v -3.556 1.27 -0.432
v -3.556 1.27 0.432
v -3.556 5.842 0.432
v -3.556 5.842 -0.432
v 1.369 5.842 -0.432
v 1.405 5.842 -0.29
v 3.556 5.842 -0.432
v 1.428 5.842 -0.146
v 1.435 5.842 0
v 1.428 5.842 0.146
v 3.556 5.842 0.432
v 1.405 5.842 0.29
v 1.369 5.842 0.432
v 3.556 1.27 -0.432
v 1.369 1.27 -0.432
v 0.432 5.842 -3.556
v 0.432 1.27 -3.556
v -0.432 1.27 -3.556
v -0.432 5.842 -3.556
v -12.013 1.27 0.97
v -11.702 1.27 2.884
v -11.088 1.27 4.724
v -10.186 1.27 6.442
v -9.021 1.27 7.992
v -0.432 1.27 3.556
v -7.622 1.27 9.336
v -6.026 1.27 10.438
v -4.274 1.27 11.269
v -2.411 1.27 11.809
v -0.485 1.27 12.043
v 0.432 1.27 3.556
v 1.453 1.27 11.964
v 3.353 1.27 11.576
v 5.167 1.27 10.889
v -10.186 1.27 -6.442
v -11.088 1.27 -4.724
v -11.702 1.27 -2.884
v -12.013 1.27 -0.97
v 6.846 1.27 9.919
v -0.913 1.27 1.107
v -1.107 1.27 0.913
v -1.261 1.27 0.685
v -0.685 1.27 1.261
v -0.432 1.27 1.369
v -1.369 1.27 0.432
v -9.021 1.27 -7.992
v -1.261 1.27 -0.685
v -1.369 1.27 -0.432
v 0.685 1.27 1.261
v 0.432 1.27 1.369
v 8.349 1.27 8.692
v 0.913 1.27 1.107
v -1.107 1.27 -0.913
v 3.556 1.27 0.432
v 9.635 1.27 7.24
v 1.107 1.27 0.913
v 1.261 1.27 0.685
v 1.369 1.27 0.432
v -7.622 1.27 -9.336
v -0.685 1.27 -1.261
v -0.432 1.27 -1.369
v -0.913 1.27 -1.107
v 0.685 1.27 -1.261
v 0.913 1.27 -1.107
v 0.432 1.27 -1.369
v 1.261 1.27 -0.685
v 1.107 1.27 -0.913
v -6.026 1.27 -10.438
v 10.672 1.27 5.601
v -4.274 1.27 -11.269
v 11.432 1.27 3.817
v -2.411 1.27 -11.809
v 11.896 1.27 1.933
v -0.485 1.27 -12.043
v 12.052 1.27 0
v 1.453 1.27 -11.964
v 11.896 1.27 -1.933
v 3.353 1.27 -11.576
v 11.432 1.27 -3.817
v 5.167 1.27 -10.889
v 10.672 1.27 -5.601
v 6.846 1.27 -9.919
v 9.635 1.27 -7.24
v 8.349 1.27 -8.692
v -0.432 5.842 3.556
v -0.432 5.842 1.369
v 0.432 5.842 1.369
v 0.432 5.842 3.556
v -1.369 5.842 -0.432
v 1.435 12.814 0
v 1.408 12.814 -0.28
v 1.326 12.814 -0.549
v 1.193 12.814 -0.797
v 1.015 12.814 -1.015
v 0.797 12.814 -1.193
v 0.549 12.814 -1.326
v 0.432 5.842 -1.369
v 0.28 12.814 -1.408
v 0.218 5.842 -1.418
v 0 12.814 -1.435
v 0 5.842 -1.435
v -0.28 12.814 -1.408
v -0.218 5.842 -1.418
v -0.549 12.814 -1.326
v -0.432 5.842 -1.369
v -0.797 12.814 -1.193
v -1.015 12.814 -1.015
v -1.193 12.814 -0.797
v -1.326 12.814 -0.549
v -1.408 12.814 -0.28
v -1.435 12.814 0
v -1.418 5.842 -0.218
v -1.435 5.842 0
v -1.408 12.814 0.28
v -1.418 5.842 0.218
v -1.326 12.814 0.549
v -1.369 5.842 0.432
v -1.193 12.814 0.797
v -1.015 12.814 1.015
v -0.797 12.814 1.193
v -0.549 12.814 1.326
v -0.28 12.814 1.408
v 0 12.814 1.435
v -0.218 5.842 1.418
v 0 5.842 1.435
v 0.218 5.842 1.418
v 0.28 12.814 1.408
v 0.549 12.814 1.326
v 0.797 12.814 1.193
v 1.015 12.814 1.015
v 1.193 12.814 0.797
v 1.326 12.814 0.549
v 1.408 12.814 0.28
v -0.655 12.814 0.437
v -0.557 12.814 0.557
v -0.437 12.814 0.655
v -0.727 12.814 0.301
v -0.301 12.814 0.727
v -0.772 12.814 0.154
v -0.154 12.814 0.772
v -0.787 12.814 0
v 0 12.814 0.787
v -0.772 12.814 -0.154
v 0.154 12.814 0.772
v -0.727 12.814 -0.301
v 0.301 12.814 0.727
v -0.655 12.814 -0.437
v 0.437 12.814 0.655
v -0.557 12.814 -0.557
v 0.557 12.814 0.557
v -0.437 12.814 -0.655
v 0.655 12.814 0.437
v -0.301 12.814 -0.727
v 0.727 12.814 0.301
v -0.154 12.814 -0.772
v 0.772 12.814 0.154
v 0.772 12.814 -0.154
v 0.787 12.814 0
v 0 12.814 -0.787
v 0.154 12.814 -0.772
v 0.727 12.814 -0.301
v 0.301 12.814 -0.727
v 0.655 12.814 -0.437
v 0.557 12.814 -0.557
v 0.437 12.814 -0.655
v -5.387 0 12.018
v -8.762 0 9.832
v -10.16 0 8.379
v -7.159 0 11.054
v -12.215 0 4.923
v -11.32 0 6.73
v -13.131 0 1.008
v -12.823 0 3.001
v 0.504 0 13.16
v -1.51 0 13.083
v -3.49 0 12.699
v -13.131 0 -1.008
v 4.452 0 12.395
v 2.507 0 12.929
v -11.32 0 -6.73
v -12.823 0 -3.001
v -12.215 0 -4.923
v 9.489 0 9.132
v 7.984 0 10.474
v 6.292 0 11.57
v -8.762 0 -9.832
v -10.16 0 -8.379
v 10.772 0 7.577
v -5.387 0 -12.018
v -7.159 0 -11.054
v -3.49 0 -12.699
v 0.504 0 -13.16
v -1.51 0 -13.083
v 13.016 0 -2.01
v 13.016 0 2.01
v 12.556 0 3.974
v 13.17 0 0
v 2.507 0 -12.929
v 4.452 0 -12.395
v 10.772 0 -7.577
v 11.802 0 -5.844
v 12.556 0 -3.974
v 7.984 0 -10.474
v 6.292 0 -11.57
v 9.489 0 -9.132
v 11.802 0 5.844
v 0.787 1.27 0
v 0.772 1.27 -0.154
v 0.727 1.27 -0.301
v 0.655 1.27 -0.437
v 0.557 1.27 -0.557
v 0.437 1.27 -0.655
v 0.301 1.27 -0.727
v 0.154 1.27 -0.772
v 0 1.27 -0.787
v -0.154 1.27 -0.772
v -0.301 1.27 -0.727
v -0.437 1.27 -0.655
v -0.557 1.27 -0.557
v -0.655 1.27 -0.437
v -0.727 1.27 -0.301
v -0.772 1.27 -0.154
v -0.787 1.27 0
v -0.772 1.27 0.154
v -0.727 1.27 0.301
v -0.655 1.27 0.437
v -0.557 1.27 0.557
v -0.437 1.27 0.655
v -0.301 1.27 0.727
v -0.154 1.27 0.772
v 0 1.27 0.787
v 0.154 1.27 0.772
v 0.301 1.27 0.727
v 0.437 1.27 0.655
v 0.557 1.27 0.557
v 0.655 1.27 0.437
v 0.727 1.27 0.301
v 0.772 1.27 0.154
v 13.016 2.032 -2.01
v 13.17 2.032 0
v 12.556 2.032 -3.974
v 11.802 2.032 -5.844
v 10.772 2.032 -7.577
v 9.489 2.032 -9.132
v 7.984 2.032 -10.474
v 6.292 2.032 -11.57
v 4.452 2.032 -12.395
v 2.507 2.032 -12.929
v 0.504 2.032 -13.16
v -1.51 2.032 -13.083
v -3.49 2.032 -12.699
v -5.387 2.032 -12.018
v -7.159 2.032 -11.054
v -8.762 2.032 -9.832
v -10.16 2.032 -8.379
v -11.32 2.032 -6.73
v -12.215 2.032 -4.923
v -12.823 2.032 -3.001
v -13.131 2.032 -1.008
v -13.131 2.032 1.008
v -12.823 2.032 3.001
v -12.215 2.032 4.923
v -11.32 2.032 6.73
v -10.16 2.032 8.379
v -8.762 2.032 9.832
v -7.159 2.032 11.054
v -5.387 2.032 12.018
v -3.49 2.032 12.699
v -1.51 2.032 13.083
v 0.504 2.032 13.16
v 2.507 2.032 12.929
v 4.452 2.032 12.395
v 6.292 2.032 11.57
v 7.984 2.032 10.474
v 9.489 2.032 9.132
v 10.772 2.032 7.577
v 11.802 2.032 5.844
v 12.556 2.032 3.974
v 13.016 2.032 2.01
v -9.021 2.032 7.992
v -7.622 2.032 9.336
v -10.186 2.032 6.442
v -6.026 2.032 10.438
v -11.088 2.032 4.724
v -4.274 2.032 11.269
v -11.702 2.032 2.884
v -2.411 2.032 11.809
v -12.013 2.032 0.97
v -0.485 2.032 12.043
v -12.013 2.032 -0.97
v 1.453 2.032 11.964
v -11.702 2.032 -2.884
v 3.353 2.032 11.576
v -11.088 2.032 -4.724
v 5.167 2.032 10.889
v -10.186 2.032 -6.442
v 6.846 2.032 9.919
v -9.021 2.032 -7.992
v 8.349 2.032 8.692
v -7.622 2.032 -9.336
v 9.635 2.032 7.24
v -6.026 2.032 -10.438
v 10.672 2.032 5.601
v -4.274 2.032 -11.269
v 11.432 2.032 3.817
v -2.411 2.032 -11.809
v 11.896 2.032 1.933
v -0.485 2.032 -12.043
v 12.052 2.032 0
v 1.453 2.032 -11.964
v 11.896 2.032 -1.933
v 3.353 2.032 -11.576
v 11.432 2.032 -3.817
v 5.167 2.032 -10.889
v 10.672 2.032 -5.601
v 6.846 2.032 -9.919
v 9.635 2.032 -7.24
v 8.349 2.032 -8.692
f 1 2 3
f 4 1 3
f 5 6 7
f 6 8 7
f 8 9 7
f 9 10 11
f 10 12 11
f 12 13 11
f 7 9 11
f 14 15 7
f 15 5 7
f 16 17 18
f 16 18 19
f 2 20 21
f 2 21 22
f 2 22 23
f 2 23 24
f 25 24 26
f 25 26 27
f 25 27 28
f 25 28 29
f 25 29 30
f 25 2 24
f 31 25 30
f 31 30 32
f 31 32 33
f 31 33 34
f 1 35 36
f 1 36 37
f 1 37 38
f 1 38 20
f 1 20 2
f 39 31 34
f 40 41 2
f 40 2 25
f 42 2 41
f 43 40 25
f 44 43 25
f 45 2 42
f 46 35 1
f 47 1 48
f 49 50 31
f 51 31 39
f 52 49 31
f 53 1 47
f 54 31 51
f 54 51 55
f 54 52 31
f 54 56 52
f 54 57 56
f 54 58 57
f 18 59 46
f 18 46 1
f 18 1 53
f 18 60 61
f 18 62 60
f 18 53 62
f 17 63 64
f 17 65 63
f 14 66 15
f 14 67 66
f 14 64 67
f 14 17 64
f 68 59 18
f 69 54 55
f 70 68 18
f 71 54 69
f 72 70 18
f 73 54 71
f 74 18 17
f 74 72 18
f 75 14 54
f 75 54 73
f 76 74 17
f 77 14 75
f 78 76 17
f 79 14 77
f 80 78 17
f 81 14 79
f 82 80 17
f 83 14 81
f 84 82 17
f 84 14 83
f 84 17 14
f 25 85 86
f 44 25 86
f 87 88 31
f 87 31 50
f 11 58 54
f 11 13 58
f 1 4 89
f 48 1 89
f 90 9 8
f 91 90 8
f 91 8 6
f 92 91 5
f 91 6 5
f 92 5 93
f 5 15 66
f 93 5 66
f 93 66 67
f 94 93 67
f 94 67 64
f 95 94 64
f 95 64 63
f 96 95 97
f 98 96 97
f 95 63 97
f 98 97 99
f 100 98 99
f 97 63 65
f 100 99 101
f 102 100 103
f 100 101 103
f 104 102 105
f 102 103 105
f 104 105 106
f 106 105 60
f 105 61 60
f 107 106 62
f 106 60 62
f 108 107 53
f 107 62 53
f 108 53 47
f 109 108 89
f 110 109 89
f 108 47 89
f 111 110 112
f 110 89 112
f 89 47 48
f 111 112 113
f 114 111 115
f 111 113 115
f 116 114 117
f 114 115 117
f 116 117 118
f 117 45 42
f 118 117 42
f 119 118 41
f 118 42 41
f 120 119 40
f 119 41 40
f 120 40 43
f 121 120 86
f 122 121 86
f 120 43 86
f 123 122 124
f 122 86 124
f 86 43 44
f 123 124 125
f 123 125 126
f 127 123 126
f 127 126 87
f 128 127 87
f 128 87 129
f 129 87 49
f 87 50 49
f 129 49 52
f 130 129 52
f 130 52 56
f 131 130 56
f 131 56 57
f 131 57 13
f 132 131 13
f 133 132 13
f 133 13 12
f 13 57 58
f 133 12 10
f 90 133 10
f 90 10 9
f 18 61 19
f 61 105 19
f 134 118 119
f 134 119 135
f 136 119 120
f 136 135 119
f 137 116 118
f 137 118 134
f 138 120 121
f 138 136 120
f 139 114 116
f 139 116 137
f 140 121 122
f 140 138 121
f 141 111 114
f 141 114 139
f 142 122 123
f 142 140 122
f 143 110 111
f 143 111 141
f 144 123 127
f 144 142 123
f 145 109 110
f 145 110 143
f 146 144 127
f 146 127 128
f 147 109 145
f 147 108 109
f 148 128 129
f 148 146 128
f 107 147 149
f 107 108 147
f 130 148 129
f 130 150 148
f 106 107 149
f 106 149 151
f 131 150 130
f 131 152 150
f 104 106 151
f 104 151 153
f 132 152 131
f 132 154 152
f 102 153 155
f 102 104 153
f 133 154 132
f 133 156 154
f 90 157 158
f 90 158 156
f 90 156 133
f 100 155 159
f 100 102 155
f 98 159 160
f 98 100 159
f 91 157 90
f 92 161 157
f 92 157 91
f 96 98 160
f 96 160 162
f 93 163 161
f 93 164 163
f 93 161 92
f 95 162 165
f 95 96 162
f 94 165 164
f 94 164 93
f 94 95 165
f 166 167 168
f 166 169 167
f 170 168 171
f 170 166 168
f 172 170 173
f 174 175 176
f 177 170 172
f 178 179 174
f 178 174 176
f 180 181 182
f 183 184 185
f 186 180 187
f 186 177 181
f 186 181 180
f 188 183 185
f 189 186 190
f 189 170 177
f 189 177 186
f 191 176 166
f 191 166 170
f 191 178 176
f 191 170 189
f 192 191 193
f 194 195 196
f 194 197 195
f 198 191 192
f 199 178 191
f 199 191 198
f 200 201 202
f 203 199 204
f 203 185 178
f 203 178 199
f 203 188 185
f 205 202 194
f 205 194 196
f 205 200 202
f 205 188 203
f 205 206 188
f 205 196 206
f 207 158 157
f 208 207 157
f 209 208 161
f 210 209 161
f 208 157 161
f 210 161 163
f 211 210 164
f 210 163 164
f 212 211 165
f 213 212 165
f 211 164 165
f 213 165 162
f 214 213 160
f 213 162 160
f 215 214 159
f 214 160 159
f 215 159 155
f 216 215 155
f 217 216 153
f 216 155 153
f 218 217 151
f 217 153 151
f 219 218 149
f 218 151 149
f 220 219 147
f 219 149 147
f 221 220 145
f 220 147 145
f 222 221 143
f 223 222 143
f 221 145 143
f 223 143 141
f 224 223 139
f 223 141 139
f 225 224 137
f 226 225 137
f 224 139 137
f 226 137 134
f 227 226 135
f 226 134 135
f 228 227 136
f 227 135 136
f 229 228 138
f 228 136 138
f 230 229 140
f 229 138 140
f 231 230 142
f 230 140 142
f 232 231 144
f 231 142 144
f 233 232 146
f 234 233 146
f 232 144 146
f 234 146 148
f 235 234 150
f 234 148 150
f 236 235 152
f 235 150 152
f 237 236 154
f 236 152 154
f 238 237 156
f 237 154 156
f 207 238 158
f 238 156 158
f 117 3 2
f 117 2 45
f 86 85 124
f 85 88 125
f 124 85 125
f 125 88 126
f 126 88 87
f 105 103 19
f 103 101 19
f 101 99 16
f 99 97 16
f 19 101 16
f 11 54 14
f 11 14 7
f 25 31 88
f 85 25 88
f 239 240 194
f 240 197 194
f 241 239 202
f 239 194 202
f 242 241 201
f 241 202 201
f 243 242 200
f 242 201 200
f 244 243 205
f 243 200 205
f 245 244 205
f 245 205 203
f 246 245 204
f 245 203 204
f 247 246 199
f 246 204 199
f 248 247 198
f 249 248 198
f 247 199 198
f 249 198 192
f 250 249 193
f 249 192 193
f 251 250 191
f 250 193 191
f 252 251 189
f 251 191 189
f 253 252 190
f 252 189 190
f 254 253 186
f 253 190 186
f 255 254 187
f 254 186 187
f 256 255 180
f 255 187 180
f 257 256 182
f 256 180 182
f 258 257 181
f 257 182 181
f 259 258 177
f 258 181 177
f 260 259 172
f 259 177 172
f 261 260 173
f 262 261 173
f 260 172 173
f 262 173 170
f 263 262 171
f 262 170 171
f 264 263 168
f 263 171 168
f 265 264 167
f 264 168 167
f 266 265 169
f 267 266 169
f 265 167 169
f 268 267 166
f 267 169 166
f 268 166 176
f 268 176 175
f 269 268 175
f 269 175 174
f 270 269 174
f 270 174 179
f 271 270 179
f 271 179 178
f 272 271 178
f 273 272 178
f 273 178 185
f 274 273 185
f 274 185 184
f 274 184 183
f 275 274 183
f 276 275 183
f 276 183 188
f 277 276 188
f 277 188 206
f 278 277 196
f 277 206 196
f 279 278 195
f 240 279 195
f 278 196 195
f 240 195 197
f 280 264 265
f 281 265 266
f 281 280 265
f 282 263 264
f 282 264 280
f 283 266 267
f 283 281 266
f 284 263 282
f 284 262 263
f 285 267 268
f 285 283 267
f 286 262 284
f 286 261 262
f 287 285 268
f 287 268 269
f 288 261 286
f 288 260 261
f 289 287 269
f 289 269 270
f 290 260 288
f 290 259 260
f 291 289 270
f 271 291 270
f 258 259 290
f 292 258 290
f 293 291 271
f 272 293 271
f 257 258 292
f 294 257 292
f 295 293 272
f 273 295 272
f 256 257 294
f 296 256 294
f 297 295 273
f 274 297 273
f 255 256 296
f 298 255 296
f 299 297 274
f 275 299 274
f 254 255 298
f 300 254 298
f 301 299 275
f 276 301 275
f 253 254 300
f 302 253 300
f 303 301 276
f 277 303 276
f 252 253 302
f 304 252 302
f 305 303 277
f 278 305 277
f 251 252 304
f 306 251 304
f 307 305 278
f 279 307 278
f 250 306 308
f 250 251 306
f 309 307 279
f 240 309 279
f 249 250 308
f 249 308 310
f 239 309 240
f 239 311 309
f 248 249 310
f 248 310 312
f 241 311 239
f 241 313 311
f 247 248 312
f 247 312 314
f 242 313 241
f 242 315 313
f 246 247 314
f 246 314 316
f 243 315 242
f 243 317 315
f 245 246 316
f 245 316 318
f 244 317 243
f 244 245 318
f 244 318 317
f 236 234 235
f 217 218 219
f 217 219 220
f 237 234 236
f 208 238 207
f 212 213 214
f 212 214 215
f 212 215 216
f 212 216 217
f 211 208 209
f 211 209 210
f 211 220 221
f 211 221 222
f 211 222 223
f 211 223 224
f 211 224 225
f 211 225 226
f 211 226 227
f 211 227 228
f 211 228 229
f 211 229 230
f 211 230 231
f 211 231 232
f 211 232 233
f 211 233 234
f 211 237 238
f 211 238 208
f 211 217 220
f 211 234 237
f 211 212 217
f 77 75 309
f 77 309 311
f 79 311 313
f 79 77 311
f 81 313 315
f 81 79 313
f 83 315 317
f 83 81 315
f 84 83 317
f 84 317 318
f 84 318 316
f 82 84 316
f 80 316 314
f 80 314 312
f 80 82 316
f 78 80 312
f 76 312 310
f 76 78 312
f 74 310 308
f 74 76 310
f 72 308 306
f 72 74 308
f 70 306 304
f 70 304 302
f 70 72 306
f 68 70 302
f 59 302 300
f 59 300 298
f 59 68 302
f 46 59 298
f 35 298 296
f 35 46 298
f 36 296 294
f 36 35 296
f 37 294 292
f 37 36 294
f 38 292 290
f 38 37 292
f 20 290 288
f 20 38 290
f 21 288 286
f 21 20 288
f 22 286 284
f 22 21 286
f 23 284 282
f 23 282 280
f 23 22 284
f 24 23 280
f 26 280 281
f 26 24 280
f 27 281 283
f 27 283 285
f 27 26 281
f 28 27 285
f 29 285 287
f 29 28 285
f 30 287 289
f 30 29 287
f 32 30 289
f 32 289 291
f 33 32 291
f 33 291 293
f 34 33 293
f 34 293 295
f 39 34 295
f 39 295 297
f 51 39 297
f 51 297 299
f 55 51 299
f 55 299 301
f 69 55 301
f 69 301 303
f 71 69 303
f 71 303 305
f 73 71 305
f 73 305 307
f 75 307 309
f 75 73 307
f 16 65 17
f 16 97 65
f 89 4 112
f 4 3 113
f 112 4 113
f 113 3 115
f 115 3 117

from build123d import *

# Parameters (mm, degrees)
SKETCH1_R           = 13.1699
BOSS_EXTRUDE1_DEPTH = 1.27
SKETCH2_R           = 13.1699
SKETCH2_R_2         = 12.0523
BOSS_EXTRUDE2_DEPTH = 0.762
SKETCH3_R           = 1.4351
BOSS_EXTRUDE3_DEPTH = 11.5443
SKETCH6_W           = 7.112
SKETCH6_H           = 5.842
BOSS_EXTRUDE4_DEPTH = 0.4318
SKETCH7_W           = 7.112
SKETCH7_H           = 5.842
BOSS_EXTRUDE5_DEPTH = 0.4318
SKETCH4_R           = 0.7874
CUT_EXTRUDE1_DEPTH  = 11.5443


with BuildPart() as part:
    # Sketch1 → Boss-Extrude1 (new body)
    with BuildSketch(Plane(origin=(0, 0, 0), x_dir=(1, 0, 0), z_dir=(0, 1, 0))):
        Circle(SKETCH1_R)
    extrude(amount=BOSS_EXTRUDE1_DEPTH)

    # Sketch2 → Boss-Extrude2 (add)
    with BuildSketch(Plane(origin=(0, 1.27, 0), x_dir=(1, 0, 0), z_dir=(0, 1, 0))):
        Circle(SKETCH2_R)
        Circle(SKETCH2_R_2, mode=Mode.SUBTRACT)
    extrude(amount=BOSS_EXTRUDE2_DEPTH)

    # Sketch3 → Boss-Extrude3 (add)
    with BuildSketch(Plane(origin=(0, 1.27, 0), x_dir=(1, 0, 0), z_dir=(0, 1, 0))):
        Circle(SKETCH3_R)
    extrude(amount=BOSS_EXTRUDE3_DEPTH)

    # Sketch6 → Boss-Extrude4 (add, symmetric)
    with BuildSketch(Plane.XY):
        with Locations((0, 2.921)):
            Rectangle(SKETCH6_W, SKETCH6_H)
    extrude(amount=BOSS_EXTRUDE4_DEPTH, both=True)

    # Sketch7 → Boss-Extrude5 (add, symmetric)
    with BuildSketch(Plane(origin=(0, 0, 0), x_dir=(0, 0, -1), z_dir=(1, 0, 0))):
        with Locations((0, 2.921)):
            Rectangle(SKETCH7_W, SKETCH7_H)
    extrude(amount=BOSS_EXTRUDE5_DEPTH, both=True)

    # Sketch4 → Cut-Extrude1 (cut)
    with BuildSketch(Plane(origin=(0, 12.8143, 0), x_dir=(1, 0, 0), z_dir=(0, 1, 0))):
        Circle(SKETCH4_R)
    extrude(amount=-CUT_EXTRUDE1_DEPTH, mode=Mode.SUBTRACT)


solid = part.part
